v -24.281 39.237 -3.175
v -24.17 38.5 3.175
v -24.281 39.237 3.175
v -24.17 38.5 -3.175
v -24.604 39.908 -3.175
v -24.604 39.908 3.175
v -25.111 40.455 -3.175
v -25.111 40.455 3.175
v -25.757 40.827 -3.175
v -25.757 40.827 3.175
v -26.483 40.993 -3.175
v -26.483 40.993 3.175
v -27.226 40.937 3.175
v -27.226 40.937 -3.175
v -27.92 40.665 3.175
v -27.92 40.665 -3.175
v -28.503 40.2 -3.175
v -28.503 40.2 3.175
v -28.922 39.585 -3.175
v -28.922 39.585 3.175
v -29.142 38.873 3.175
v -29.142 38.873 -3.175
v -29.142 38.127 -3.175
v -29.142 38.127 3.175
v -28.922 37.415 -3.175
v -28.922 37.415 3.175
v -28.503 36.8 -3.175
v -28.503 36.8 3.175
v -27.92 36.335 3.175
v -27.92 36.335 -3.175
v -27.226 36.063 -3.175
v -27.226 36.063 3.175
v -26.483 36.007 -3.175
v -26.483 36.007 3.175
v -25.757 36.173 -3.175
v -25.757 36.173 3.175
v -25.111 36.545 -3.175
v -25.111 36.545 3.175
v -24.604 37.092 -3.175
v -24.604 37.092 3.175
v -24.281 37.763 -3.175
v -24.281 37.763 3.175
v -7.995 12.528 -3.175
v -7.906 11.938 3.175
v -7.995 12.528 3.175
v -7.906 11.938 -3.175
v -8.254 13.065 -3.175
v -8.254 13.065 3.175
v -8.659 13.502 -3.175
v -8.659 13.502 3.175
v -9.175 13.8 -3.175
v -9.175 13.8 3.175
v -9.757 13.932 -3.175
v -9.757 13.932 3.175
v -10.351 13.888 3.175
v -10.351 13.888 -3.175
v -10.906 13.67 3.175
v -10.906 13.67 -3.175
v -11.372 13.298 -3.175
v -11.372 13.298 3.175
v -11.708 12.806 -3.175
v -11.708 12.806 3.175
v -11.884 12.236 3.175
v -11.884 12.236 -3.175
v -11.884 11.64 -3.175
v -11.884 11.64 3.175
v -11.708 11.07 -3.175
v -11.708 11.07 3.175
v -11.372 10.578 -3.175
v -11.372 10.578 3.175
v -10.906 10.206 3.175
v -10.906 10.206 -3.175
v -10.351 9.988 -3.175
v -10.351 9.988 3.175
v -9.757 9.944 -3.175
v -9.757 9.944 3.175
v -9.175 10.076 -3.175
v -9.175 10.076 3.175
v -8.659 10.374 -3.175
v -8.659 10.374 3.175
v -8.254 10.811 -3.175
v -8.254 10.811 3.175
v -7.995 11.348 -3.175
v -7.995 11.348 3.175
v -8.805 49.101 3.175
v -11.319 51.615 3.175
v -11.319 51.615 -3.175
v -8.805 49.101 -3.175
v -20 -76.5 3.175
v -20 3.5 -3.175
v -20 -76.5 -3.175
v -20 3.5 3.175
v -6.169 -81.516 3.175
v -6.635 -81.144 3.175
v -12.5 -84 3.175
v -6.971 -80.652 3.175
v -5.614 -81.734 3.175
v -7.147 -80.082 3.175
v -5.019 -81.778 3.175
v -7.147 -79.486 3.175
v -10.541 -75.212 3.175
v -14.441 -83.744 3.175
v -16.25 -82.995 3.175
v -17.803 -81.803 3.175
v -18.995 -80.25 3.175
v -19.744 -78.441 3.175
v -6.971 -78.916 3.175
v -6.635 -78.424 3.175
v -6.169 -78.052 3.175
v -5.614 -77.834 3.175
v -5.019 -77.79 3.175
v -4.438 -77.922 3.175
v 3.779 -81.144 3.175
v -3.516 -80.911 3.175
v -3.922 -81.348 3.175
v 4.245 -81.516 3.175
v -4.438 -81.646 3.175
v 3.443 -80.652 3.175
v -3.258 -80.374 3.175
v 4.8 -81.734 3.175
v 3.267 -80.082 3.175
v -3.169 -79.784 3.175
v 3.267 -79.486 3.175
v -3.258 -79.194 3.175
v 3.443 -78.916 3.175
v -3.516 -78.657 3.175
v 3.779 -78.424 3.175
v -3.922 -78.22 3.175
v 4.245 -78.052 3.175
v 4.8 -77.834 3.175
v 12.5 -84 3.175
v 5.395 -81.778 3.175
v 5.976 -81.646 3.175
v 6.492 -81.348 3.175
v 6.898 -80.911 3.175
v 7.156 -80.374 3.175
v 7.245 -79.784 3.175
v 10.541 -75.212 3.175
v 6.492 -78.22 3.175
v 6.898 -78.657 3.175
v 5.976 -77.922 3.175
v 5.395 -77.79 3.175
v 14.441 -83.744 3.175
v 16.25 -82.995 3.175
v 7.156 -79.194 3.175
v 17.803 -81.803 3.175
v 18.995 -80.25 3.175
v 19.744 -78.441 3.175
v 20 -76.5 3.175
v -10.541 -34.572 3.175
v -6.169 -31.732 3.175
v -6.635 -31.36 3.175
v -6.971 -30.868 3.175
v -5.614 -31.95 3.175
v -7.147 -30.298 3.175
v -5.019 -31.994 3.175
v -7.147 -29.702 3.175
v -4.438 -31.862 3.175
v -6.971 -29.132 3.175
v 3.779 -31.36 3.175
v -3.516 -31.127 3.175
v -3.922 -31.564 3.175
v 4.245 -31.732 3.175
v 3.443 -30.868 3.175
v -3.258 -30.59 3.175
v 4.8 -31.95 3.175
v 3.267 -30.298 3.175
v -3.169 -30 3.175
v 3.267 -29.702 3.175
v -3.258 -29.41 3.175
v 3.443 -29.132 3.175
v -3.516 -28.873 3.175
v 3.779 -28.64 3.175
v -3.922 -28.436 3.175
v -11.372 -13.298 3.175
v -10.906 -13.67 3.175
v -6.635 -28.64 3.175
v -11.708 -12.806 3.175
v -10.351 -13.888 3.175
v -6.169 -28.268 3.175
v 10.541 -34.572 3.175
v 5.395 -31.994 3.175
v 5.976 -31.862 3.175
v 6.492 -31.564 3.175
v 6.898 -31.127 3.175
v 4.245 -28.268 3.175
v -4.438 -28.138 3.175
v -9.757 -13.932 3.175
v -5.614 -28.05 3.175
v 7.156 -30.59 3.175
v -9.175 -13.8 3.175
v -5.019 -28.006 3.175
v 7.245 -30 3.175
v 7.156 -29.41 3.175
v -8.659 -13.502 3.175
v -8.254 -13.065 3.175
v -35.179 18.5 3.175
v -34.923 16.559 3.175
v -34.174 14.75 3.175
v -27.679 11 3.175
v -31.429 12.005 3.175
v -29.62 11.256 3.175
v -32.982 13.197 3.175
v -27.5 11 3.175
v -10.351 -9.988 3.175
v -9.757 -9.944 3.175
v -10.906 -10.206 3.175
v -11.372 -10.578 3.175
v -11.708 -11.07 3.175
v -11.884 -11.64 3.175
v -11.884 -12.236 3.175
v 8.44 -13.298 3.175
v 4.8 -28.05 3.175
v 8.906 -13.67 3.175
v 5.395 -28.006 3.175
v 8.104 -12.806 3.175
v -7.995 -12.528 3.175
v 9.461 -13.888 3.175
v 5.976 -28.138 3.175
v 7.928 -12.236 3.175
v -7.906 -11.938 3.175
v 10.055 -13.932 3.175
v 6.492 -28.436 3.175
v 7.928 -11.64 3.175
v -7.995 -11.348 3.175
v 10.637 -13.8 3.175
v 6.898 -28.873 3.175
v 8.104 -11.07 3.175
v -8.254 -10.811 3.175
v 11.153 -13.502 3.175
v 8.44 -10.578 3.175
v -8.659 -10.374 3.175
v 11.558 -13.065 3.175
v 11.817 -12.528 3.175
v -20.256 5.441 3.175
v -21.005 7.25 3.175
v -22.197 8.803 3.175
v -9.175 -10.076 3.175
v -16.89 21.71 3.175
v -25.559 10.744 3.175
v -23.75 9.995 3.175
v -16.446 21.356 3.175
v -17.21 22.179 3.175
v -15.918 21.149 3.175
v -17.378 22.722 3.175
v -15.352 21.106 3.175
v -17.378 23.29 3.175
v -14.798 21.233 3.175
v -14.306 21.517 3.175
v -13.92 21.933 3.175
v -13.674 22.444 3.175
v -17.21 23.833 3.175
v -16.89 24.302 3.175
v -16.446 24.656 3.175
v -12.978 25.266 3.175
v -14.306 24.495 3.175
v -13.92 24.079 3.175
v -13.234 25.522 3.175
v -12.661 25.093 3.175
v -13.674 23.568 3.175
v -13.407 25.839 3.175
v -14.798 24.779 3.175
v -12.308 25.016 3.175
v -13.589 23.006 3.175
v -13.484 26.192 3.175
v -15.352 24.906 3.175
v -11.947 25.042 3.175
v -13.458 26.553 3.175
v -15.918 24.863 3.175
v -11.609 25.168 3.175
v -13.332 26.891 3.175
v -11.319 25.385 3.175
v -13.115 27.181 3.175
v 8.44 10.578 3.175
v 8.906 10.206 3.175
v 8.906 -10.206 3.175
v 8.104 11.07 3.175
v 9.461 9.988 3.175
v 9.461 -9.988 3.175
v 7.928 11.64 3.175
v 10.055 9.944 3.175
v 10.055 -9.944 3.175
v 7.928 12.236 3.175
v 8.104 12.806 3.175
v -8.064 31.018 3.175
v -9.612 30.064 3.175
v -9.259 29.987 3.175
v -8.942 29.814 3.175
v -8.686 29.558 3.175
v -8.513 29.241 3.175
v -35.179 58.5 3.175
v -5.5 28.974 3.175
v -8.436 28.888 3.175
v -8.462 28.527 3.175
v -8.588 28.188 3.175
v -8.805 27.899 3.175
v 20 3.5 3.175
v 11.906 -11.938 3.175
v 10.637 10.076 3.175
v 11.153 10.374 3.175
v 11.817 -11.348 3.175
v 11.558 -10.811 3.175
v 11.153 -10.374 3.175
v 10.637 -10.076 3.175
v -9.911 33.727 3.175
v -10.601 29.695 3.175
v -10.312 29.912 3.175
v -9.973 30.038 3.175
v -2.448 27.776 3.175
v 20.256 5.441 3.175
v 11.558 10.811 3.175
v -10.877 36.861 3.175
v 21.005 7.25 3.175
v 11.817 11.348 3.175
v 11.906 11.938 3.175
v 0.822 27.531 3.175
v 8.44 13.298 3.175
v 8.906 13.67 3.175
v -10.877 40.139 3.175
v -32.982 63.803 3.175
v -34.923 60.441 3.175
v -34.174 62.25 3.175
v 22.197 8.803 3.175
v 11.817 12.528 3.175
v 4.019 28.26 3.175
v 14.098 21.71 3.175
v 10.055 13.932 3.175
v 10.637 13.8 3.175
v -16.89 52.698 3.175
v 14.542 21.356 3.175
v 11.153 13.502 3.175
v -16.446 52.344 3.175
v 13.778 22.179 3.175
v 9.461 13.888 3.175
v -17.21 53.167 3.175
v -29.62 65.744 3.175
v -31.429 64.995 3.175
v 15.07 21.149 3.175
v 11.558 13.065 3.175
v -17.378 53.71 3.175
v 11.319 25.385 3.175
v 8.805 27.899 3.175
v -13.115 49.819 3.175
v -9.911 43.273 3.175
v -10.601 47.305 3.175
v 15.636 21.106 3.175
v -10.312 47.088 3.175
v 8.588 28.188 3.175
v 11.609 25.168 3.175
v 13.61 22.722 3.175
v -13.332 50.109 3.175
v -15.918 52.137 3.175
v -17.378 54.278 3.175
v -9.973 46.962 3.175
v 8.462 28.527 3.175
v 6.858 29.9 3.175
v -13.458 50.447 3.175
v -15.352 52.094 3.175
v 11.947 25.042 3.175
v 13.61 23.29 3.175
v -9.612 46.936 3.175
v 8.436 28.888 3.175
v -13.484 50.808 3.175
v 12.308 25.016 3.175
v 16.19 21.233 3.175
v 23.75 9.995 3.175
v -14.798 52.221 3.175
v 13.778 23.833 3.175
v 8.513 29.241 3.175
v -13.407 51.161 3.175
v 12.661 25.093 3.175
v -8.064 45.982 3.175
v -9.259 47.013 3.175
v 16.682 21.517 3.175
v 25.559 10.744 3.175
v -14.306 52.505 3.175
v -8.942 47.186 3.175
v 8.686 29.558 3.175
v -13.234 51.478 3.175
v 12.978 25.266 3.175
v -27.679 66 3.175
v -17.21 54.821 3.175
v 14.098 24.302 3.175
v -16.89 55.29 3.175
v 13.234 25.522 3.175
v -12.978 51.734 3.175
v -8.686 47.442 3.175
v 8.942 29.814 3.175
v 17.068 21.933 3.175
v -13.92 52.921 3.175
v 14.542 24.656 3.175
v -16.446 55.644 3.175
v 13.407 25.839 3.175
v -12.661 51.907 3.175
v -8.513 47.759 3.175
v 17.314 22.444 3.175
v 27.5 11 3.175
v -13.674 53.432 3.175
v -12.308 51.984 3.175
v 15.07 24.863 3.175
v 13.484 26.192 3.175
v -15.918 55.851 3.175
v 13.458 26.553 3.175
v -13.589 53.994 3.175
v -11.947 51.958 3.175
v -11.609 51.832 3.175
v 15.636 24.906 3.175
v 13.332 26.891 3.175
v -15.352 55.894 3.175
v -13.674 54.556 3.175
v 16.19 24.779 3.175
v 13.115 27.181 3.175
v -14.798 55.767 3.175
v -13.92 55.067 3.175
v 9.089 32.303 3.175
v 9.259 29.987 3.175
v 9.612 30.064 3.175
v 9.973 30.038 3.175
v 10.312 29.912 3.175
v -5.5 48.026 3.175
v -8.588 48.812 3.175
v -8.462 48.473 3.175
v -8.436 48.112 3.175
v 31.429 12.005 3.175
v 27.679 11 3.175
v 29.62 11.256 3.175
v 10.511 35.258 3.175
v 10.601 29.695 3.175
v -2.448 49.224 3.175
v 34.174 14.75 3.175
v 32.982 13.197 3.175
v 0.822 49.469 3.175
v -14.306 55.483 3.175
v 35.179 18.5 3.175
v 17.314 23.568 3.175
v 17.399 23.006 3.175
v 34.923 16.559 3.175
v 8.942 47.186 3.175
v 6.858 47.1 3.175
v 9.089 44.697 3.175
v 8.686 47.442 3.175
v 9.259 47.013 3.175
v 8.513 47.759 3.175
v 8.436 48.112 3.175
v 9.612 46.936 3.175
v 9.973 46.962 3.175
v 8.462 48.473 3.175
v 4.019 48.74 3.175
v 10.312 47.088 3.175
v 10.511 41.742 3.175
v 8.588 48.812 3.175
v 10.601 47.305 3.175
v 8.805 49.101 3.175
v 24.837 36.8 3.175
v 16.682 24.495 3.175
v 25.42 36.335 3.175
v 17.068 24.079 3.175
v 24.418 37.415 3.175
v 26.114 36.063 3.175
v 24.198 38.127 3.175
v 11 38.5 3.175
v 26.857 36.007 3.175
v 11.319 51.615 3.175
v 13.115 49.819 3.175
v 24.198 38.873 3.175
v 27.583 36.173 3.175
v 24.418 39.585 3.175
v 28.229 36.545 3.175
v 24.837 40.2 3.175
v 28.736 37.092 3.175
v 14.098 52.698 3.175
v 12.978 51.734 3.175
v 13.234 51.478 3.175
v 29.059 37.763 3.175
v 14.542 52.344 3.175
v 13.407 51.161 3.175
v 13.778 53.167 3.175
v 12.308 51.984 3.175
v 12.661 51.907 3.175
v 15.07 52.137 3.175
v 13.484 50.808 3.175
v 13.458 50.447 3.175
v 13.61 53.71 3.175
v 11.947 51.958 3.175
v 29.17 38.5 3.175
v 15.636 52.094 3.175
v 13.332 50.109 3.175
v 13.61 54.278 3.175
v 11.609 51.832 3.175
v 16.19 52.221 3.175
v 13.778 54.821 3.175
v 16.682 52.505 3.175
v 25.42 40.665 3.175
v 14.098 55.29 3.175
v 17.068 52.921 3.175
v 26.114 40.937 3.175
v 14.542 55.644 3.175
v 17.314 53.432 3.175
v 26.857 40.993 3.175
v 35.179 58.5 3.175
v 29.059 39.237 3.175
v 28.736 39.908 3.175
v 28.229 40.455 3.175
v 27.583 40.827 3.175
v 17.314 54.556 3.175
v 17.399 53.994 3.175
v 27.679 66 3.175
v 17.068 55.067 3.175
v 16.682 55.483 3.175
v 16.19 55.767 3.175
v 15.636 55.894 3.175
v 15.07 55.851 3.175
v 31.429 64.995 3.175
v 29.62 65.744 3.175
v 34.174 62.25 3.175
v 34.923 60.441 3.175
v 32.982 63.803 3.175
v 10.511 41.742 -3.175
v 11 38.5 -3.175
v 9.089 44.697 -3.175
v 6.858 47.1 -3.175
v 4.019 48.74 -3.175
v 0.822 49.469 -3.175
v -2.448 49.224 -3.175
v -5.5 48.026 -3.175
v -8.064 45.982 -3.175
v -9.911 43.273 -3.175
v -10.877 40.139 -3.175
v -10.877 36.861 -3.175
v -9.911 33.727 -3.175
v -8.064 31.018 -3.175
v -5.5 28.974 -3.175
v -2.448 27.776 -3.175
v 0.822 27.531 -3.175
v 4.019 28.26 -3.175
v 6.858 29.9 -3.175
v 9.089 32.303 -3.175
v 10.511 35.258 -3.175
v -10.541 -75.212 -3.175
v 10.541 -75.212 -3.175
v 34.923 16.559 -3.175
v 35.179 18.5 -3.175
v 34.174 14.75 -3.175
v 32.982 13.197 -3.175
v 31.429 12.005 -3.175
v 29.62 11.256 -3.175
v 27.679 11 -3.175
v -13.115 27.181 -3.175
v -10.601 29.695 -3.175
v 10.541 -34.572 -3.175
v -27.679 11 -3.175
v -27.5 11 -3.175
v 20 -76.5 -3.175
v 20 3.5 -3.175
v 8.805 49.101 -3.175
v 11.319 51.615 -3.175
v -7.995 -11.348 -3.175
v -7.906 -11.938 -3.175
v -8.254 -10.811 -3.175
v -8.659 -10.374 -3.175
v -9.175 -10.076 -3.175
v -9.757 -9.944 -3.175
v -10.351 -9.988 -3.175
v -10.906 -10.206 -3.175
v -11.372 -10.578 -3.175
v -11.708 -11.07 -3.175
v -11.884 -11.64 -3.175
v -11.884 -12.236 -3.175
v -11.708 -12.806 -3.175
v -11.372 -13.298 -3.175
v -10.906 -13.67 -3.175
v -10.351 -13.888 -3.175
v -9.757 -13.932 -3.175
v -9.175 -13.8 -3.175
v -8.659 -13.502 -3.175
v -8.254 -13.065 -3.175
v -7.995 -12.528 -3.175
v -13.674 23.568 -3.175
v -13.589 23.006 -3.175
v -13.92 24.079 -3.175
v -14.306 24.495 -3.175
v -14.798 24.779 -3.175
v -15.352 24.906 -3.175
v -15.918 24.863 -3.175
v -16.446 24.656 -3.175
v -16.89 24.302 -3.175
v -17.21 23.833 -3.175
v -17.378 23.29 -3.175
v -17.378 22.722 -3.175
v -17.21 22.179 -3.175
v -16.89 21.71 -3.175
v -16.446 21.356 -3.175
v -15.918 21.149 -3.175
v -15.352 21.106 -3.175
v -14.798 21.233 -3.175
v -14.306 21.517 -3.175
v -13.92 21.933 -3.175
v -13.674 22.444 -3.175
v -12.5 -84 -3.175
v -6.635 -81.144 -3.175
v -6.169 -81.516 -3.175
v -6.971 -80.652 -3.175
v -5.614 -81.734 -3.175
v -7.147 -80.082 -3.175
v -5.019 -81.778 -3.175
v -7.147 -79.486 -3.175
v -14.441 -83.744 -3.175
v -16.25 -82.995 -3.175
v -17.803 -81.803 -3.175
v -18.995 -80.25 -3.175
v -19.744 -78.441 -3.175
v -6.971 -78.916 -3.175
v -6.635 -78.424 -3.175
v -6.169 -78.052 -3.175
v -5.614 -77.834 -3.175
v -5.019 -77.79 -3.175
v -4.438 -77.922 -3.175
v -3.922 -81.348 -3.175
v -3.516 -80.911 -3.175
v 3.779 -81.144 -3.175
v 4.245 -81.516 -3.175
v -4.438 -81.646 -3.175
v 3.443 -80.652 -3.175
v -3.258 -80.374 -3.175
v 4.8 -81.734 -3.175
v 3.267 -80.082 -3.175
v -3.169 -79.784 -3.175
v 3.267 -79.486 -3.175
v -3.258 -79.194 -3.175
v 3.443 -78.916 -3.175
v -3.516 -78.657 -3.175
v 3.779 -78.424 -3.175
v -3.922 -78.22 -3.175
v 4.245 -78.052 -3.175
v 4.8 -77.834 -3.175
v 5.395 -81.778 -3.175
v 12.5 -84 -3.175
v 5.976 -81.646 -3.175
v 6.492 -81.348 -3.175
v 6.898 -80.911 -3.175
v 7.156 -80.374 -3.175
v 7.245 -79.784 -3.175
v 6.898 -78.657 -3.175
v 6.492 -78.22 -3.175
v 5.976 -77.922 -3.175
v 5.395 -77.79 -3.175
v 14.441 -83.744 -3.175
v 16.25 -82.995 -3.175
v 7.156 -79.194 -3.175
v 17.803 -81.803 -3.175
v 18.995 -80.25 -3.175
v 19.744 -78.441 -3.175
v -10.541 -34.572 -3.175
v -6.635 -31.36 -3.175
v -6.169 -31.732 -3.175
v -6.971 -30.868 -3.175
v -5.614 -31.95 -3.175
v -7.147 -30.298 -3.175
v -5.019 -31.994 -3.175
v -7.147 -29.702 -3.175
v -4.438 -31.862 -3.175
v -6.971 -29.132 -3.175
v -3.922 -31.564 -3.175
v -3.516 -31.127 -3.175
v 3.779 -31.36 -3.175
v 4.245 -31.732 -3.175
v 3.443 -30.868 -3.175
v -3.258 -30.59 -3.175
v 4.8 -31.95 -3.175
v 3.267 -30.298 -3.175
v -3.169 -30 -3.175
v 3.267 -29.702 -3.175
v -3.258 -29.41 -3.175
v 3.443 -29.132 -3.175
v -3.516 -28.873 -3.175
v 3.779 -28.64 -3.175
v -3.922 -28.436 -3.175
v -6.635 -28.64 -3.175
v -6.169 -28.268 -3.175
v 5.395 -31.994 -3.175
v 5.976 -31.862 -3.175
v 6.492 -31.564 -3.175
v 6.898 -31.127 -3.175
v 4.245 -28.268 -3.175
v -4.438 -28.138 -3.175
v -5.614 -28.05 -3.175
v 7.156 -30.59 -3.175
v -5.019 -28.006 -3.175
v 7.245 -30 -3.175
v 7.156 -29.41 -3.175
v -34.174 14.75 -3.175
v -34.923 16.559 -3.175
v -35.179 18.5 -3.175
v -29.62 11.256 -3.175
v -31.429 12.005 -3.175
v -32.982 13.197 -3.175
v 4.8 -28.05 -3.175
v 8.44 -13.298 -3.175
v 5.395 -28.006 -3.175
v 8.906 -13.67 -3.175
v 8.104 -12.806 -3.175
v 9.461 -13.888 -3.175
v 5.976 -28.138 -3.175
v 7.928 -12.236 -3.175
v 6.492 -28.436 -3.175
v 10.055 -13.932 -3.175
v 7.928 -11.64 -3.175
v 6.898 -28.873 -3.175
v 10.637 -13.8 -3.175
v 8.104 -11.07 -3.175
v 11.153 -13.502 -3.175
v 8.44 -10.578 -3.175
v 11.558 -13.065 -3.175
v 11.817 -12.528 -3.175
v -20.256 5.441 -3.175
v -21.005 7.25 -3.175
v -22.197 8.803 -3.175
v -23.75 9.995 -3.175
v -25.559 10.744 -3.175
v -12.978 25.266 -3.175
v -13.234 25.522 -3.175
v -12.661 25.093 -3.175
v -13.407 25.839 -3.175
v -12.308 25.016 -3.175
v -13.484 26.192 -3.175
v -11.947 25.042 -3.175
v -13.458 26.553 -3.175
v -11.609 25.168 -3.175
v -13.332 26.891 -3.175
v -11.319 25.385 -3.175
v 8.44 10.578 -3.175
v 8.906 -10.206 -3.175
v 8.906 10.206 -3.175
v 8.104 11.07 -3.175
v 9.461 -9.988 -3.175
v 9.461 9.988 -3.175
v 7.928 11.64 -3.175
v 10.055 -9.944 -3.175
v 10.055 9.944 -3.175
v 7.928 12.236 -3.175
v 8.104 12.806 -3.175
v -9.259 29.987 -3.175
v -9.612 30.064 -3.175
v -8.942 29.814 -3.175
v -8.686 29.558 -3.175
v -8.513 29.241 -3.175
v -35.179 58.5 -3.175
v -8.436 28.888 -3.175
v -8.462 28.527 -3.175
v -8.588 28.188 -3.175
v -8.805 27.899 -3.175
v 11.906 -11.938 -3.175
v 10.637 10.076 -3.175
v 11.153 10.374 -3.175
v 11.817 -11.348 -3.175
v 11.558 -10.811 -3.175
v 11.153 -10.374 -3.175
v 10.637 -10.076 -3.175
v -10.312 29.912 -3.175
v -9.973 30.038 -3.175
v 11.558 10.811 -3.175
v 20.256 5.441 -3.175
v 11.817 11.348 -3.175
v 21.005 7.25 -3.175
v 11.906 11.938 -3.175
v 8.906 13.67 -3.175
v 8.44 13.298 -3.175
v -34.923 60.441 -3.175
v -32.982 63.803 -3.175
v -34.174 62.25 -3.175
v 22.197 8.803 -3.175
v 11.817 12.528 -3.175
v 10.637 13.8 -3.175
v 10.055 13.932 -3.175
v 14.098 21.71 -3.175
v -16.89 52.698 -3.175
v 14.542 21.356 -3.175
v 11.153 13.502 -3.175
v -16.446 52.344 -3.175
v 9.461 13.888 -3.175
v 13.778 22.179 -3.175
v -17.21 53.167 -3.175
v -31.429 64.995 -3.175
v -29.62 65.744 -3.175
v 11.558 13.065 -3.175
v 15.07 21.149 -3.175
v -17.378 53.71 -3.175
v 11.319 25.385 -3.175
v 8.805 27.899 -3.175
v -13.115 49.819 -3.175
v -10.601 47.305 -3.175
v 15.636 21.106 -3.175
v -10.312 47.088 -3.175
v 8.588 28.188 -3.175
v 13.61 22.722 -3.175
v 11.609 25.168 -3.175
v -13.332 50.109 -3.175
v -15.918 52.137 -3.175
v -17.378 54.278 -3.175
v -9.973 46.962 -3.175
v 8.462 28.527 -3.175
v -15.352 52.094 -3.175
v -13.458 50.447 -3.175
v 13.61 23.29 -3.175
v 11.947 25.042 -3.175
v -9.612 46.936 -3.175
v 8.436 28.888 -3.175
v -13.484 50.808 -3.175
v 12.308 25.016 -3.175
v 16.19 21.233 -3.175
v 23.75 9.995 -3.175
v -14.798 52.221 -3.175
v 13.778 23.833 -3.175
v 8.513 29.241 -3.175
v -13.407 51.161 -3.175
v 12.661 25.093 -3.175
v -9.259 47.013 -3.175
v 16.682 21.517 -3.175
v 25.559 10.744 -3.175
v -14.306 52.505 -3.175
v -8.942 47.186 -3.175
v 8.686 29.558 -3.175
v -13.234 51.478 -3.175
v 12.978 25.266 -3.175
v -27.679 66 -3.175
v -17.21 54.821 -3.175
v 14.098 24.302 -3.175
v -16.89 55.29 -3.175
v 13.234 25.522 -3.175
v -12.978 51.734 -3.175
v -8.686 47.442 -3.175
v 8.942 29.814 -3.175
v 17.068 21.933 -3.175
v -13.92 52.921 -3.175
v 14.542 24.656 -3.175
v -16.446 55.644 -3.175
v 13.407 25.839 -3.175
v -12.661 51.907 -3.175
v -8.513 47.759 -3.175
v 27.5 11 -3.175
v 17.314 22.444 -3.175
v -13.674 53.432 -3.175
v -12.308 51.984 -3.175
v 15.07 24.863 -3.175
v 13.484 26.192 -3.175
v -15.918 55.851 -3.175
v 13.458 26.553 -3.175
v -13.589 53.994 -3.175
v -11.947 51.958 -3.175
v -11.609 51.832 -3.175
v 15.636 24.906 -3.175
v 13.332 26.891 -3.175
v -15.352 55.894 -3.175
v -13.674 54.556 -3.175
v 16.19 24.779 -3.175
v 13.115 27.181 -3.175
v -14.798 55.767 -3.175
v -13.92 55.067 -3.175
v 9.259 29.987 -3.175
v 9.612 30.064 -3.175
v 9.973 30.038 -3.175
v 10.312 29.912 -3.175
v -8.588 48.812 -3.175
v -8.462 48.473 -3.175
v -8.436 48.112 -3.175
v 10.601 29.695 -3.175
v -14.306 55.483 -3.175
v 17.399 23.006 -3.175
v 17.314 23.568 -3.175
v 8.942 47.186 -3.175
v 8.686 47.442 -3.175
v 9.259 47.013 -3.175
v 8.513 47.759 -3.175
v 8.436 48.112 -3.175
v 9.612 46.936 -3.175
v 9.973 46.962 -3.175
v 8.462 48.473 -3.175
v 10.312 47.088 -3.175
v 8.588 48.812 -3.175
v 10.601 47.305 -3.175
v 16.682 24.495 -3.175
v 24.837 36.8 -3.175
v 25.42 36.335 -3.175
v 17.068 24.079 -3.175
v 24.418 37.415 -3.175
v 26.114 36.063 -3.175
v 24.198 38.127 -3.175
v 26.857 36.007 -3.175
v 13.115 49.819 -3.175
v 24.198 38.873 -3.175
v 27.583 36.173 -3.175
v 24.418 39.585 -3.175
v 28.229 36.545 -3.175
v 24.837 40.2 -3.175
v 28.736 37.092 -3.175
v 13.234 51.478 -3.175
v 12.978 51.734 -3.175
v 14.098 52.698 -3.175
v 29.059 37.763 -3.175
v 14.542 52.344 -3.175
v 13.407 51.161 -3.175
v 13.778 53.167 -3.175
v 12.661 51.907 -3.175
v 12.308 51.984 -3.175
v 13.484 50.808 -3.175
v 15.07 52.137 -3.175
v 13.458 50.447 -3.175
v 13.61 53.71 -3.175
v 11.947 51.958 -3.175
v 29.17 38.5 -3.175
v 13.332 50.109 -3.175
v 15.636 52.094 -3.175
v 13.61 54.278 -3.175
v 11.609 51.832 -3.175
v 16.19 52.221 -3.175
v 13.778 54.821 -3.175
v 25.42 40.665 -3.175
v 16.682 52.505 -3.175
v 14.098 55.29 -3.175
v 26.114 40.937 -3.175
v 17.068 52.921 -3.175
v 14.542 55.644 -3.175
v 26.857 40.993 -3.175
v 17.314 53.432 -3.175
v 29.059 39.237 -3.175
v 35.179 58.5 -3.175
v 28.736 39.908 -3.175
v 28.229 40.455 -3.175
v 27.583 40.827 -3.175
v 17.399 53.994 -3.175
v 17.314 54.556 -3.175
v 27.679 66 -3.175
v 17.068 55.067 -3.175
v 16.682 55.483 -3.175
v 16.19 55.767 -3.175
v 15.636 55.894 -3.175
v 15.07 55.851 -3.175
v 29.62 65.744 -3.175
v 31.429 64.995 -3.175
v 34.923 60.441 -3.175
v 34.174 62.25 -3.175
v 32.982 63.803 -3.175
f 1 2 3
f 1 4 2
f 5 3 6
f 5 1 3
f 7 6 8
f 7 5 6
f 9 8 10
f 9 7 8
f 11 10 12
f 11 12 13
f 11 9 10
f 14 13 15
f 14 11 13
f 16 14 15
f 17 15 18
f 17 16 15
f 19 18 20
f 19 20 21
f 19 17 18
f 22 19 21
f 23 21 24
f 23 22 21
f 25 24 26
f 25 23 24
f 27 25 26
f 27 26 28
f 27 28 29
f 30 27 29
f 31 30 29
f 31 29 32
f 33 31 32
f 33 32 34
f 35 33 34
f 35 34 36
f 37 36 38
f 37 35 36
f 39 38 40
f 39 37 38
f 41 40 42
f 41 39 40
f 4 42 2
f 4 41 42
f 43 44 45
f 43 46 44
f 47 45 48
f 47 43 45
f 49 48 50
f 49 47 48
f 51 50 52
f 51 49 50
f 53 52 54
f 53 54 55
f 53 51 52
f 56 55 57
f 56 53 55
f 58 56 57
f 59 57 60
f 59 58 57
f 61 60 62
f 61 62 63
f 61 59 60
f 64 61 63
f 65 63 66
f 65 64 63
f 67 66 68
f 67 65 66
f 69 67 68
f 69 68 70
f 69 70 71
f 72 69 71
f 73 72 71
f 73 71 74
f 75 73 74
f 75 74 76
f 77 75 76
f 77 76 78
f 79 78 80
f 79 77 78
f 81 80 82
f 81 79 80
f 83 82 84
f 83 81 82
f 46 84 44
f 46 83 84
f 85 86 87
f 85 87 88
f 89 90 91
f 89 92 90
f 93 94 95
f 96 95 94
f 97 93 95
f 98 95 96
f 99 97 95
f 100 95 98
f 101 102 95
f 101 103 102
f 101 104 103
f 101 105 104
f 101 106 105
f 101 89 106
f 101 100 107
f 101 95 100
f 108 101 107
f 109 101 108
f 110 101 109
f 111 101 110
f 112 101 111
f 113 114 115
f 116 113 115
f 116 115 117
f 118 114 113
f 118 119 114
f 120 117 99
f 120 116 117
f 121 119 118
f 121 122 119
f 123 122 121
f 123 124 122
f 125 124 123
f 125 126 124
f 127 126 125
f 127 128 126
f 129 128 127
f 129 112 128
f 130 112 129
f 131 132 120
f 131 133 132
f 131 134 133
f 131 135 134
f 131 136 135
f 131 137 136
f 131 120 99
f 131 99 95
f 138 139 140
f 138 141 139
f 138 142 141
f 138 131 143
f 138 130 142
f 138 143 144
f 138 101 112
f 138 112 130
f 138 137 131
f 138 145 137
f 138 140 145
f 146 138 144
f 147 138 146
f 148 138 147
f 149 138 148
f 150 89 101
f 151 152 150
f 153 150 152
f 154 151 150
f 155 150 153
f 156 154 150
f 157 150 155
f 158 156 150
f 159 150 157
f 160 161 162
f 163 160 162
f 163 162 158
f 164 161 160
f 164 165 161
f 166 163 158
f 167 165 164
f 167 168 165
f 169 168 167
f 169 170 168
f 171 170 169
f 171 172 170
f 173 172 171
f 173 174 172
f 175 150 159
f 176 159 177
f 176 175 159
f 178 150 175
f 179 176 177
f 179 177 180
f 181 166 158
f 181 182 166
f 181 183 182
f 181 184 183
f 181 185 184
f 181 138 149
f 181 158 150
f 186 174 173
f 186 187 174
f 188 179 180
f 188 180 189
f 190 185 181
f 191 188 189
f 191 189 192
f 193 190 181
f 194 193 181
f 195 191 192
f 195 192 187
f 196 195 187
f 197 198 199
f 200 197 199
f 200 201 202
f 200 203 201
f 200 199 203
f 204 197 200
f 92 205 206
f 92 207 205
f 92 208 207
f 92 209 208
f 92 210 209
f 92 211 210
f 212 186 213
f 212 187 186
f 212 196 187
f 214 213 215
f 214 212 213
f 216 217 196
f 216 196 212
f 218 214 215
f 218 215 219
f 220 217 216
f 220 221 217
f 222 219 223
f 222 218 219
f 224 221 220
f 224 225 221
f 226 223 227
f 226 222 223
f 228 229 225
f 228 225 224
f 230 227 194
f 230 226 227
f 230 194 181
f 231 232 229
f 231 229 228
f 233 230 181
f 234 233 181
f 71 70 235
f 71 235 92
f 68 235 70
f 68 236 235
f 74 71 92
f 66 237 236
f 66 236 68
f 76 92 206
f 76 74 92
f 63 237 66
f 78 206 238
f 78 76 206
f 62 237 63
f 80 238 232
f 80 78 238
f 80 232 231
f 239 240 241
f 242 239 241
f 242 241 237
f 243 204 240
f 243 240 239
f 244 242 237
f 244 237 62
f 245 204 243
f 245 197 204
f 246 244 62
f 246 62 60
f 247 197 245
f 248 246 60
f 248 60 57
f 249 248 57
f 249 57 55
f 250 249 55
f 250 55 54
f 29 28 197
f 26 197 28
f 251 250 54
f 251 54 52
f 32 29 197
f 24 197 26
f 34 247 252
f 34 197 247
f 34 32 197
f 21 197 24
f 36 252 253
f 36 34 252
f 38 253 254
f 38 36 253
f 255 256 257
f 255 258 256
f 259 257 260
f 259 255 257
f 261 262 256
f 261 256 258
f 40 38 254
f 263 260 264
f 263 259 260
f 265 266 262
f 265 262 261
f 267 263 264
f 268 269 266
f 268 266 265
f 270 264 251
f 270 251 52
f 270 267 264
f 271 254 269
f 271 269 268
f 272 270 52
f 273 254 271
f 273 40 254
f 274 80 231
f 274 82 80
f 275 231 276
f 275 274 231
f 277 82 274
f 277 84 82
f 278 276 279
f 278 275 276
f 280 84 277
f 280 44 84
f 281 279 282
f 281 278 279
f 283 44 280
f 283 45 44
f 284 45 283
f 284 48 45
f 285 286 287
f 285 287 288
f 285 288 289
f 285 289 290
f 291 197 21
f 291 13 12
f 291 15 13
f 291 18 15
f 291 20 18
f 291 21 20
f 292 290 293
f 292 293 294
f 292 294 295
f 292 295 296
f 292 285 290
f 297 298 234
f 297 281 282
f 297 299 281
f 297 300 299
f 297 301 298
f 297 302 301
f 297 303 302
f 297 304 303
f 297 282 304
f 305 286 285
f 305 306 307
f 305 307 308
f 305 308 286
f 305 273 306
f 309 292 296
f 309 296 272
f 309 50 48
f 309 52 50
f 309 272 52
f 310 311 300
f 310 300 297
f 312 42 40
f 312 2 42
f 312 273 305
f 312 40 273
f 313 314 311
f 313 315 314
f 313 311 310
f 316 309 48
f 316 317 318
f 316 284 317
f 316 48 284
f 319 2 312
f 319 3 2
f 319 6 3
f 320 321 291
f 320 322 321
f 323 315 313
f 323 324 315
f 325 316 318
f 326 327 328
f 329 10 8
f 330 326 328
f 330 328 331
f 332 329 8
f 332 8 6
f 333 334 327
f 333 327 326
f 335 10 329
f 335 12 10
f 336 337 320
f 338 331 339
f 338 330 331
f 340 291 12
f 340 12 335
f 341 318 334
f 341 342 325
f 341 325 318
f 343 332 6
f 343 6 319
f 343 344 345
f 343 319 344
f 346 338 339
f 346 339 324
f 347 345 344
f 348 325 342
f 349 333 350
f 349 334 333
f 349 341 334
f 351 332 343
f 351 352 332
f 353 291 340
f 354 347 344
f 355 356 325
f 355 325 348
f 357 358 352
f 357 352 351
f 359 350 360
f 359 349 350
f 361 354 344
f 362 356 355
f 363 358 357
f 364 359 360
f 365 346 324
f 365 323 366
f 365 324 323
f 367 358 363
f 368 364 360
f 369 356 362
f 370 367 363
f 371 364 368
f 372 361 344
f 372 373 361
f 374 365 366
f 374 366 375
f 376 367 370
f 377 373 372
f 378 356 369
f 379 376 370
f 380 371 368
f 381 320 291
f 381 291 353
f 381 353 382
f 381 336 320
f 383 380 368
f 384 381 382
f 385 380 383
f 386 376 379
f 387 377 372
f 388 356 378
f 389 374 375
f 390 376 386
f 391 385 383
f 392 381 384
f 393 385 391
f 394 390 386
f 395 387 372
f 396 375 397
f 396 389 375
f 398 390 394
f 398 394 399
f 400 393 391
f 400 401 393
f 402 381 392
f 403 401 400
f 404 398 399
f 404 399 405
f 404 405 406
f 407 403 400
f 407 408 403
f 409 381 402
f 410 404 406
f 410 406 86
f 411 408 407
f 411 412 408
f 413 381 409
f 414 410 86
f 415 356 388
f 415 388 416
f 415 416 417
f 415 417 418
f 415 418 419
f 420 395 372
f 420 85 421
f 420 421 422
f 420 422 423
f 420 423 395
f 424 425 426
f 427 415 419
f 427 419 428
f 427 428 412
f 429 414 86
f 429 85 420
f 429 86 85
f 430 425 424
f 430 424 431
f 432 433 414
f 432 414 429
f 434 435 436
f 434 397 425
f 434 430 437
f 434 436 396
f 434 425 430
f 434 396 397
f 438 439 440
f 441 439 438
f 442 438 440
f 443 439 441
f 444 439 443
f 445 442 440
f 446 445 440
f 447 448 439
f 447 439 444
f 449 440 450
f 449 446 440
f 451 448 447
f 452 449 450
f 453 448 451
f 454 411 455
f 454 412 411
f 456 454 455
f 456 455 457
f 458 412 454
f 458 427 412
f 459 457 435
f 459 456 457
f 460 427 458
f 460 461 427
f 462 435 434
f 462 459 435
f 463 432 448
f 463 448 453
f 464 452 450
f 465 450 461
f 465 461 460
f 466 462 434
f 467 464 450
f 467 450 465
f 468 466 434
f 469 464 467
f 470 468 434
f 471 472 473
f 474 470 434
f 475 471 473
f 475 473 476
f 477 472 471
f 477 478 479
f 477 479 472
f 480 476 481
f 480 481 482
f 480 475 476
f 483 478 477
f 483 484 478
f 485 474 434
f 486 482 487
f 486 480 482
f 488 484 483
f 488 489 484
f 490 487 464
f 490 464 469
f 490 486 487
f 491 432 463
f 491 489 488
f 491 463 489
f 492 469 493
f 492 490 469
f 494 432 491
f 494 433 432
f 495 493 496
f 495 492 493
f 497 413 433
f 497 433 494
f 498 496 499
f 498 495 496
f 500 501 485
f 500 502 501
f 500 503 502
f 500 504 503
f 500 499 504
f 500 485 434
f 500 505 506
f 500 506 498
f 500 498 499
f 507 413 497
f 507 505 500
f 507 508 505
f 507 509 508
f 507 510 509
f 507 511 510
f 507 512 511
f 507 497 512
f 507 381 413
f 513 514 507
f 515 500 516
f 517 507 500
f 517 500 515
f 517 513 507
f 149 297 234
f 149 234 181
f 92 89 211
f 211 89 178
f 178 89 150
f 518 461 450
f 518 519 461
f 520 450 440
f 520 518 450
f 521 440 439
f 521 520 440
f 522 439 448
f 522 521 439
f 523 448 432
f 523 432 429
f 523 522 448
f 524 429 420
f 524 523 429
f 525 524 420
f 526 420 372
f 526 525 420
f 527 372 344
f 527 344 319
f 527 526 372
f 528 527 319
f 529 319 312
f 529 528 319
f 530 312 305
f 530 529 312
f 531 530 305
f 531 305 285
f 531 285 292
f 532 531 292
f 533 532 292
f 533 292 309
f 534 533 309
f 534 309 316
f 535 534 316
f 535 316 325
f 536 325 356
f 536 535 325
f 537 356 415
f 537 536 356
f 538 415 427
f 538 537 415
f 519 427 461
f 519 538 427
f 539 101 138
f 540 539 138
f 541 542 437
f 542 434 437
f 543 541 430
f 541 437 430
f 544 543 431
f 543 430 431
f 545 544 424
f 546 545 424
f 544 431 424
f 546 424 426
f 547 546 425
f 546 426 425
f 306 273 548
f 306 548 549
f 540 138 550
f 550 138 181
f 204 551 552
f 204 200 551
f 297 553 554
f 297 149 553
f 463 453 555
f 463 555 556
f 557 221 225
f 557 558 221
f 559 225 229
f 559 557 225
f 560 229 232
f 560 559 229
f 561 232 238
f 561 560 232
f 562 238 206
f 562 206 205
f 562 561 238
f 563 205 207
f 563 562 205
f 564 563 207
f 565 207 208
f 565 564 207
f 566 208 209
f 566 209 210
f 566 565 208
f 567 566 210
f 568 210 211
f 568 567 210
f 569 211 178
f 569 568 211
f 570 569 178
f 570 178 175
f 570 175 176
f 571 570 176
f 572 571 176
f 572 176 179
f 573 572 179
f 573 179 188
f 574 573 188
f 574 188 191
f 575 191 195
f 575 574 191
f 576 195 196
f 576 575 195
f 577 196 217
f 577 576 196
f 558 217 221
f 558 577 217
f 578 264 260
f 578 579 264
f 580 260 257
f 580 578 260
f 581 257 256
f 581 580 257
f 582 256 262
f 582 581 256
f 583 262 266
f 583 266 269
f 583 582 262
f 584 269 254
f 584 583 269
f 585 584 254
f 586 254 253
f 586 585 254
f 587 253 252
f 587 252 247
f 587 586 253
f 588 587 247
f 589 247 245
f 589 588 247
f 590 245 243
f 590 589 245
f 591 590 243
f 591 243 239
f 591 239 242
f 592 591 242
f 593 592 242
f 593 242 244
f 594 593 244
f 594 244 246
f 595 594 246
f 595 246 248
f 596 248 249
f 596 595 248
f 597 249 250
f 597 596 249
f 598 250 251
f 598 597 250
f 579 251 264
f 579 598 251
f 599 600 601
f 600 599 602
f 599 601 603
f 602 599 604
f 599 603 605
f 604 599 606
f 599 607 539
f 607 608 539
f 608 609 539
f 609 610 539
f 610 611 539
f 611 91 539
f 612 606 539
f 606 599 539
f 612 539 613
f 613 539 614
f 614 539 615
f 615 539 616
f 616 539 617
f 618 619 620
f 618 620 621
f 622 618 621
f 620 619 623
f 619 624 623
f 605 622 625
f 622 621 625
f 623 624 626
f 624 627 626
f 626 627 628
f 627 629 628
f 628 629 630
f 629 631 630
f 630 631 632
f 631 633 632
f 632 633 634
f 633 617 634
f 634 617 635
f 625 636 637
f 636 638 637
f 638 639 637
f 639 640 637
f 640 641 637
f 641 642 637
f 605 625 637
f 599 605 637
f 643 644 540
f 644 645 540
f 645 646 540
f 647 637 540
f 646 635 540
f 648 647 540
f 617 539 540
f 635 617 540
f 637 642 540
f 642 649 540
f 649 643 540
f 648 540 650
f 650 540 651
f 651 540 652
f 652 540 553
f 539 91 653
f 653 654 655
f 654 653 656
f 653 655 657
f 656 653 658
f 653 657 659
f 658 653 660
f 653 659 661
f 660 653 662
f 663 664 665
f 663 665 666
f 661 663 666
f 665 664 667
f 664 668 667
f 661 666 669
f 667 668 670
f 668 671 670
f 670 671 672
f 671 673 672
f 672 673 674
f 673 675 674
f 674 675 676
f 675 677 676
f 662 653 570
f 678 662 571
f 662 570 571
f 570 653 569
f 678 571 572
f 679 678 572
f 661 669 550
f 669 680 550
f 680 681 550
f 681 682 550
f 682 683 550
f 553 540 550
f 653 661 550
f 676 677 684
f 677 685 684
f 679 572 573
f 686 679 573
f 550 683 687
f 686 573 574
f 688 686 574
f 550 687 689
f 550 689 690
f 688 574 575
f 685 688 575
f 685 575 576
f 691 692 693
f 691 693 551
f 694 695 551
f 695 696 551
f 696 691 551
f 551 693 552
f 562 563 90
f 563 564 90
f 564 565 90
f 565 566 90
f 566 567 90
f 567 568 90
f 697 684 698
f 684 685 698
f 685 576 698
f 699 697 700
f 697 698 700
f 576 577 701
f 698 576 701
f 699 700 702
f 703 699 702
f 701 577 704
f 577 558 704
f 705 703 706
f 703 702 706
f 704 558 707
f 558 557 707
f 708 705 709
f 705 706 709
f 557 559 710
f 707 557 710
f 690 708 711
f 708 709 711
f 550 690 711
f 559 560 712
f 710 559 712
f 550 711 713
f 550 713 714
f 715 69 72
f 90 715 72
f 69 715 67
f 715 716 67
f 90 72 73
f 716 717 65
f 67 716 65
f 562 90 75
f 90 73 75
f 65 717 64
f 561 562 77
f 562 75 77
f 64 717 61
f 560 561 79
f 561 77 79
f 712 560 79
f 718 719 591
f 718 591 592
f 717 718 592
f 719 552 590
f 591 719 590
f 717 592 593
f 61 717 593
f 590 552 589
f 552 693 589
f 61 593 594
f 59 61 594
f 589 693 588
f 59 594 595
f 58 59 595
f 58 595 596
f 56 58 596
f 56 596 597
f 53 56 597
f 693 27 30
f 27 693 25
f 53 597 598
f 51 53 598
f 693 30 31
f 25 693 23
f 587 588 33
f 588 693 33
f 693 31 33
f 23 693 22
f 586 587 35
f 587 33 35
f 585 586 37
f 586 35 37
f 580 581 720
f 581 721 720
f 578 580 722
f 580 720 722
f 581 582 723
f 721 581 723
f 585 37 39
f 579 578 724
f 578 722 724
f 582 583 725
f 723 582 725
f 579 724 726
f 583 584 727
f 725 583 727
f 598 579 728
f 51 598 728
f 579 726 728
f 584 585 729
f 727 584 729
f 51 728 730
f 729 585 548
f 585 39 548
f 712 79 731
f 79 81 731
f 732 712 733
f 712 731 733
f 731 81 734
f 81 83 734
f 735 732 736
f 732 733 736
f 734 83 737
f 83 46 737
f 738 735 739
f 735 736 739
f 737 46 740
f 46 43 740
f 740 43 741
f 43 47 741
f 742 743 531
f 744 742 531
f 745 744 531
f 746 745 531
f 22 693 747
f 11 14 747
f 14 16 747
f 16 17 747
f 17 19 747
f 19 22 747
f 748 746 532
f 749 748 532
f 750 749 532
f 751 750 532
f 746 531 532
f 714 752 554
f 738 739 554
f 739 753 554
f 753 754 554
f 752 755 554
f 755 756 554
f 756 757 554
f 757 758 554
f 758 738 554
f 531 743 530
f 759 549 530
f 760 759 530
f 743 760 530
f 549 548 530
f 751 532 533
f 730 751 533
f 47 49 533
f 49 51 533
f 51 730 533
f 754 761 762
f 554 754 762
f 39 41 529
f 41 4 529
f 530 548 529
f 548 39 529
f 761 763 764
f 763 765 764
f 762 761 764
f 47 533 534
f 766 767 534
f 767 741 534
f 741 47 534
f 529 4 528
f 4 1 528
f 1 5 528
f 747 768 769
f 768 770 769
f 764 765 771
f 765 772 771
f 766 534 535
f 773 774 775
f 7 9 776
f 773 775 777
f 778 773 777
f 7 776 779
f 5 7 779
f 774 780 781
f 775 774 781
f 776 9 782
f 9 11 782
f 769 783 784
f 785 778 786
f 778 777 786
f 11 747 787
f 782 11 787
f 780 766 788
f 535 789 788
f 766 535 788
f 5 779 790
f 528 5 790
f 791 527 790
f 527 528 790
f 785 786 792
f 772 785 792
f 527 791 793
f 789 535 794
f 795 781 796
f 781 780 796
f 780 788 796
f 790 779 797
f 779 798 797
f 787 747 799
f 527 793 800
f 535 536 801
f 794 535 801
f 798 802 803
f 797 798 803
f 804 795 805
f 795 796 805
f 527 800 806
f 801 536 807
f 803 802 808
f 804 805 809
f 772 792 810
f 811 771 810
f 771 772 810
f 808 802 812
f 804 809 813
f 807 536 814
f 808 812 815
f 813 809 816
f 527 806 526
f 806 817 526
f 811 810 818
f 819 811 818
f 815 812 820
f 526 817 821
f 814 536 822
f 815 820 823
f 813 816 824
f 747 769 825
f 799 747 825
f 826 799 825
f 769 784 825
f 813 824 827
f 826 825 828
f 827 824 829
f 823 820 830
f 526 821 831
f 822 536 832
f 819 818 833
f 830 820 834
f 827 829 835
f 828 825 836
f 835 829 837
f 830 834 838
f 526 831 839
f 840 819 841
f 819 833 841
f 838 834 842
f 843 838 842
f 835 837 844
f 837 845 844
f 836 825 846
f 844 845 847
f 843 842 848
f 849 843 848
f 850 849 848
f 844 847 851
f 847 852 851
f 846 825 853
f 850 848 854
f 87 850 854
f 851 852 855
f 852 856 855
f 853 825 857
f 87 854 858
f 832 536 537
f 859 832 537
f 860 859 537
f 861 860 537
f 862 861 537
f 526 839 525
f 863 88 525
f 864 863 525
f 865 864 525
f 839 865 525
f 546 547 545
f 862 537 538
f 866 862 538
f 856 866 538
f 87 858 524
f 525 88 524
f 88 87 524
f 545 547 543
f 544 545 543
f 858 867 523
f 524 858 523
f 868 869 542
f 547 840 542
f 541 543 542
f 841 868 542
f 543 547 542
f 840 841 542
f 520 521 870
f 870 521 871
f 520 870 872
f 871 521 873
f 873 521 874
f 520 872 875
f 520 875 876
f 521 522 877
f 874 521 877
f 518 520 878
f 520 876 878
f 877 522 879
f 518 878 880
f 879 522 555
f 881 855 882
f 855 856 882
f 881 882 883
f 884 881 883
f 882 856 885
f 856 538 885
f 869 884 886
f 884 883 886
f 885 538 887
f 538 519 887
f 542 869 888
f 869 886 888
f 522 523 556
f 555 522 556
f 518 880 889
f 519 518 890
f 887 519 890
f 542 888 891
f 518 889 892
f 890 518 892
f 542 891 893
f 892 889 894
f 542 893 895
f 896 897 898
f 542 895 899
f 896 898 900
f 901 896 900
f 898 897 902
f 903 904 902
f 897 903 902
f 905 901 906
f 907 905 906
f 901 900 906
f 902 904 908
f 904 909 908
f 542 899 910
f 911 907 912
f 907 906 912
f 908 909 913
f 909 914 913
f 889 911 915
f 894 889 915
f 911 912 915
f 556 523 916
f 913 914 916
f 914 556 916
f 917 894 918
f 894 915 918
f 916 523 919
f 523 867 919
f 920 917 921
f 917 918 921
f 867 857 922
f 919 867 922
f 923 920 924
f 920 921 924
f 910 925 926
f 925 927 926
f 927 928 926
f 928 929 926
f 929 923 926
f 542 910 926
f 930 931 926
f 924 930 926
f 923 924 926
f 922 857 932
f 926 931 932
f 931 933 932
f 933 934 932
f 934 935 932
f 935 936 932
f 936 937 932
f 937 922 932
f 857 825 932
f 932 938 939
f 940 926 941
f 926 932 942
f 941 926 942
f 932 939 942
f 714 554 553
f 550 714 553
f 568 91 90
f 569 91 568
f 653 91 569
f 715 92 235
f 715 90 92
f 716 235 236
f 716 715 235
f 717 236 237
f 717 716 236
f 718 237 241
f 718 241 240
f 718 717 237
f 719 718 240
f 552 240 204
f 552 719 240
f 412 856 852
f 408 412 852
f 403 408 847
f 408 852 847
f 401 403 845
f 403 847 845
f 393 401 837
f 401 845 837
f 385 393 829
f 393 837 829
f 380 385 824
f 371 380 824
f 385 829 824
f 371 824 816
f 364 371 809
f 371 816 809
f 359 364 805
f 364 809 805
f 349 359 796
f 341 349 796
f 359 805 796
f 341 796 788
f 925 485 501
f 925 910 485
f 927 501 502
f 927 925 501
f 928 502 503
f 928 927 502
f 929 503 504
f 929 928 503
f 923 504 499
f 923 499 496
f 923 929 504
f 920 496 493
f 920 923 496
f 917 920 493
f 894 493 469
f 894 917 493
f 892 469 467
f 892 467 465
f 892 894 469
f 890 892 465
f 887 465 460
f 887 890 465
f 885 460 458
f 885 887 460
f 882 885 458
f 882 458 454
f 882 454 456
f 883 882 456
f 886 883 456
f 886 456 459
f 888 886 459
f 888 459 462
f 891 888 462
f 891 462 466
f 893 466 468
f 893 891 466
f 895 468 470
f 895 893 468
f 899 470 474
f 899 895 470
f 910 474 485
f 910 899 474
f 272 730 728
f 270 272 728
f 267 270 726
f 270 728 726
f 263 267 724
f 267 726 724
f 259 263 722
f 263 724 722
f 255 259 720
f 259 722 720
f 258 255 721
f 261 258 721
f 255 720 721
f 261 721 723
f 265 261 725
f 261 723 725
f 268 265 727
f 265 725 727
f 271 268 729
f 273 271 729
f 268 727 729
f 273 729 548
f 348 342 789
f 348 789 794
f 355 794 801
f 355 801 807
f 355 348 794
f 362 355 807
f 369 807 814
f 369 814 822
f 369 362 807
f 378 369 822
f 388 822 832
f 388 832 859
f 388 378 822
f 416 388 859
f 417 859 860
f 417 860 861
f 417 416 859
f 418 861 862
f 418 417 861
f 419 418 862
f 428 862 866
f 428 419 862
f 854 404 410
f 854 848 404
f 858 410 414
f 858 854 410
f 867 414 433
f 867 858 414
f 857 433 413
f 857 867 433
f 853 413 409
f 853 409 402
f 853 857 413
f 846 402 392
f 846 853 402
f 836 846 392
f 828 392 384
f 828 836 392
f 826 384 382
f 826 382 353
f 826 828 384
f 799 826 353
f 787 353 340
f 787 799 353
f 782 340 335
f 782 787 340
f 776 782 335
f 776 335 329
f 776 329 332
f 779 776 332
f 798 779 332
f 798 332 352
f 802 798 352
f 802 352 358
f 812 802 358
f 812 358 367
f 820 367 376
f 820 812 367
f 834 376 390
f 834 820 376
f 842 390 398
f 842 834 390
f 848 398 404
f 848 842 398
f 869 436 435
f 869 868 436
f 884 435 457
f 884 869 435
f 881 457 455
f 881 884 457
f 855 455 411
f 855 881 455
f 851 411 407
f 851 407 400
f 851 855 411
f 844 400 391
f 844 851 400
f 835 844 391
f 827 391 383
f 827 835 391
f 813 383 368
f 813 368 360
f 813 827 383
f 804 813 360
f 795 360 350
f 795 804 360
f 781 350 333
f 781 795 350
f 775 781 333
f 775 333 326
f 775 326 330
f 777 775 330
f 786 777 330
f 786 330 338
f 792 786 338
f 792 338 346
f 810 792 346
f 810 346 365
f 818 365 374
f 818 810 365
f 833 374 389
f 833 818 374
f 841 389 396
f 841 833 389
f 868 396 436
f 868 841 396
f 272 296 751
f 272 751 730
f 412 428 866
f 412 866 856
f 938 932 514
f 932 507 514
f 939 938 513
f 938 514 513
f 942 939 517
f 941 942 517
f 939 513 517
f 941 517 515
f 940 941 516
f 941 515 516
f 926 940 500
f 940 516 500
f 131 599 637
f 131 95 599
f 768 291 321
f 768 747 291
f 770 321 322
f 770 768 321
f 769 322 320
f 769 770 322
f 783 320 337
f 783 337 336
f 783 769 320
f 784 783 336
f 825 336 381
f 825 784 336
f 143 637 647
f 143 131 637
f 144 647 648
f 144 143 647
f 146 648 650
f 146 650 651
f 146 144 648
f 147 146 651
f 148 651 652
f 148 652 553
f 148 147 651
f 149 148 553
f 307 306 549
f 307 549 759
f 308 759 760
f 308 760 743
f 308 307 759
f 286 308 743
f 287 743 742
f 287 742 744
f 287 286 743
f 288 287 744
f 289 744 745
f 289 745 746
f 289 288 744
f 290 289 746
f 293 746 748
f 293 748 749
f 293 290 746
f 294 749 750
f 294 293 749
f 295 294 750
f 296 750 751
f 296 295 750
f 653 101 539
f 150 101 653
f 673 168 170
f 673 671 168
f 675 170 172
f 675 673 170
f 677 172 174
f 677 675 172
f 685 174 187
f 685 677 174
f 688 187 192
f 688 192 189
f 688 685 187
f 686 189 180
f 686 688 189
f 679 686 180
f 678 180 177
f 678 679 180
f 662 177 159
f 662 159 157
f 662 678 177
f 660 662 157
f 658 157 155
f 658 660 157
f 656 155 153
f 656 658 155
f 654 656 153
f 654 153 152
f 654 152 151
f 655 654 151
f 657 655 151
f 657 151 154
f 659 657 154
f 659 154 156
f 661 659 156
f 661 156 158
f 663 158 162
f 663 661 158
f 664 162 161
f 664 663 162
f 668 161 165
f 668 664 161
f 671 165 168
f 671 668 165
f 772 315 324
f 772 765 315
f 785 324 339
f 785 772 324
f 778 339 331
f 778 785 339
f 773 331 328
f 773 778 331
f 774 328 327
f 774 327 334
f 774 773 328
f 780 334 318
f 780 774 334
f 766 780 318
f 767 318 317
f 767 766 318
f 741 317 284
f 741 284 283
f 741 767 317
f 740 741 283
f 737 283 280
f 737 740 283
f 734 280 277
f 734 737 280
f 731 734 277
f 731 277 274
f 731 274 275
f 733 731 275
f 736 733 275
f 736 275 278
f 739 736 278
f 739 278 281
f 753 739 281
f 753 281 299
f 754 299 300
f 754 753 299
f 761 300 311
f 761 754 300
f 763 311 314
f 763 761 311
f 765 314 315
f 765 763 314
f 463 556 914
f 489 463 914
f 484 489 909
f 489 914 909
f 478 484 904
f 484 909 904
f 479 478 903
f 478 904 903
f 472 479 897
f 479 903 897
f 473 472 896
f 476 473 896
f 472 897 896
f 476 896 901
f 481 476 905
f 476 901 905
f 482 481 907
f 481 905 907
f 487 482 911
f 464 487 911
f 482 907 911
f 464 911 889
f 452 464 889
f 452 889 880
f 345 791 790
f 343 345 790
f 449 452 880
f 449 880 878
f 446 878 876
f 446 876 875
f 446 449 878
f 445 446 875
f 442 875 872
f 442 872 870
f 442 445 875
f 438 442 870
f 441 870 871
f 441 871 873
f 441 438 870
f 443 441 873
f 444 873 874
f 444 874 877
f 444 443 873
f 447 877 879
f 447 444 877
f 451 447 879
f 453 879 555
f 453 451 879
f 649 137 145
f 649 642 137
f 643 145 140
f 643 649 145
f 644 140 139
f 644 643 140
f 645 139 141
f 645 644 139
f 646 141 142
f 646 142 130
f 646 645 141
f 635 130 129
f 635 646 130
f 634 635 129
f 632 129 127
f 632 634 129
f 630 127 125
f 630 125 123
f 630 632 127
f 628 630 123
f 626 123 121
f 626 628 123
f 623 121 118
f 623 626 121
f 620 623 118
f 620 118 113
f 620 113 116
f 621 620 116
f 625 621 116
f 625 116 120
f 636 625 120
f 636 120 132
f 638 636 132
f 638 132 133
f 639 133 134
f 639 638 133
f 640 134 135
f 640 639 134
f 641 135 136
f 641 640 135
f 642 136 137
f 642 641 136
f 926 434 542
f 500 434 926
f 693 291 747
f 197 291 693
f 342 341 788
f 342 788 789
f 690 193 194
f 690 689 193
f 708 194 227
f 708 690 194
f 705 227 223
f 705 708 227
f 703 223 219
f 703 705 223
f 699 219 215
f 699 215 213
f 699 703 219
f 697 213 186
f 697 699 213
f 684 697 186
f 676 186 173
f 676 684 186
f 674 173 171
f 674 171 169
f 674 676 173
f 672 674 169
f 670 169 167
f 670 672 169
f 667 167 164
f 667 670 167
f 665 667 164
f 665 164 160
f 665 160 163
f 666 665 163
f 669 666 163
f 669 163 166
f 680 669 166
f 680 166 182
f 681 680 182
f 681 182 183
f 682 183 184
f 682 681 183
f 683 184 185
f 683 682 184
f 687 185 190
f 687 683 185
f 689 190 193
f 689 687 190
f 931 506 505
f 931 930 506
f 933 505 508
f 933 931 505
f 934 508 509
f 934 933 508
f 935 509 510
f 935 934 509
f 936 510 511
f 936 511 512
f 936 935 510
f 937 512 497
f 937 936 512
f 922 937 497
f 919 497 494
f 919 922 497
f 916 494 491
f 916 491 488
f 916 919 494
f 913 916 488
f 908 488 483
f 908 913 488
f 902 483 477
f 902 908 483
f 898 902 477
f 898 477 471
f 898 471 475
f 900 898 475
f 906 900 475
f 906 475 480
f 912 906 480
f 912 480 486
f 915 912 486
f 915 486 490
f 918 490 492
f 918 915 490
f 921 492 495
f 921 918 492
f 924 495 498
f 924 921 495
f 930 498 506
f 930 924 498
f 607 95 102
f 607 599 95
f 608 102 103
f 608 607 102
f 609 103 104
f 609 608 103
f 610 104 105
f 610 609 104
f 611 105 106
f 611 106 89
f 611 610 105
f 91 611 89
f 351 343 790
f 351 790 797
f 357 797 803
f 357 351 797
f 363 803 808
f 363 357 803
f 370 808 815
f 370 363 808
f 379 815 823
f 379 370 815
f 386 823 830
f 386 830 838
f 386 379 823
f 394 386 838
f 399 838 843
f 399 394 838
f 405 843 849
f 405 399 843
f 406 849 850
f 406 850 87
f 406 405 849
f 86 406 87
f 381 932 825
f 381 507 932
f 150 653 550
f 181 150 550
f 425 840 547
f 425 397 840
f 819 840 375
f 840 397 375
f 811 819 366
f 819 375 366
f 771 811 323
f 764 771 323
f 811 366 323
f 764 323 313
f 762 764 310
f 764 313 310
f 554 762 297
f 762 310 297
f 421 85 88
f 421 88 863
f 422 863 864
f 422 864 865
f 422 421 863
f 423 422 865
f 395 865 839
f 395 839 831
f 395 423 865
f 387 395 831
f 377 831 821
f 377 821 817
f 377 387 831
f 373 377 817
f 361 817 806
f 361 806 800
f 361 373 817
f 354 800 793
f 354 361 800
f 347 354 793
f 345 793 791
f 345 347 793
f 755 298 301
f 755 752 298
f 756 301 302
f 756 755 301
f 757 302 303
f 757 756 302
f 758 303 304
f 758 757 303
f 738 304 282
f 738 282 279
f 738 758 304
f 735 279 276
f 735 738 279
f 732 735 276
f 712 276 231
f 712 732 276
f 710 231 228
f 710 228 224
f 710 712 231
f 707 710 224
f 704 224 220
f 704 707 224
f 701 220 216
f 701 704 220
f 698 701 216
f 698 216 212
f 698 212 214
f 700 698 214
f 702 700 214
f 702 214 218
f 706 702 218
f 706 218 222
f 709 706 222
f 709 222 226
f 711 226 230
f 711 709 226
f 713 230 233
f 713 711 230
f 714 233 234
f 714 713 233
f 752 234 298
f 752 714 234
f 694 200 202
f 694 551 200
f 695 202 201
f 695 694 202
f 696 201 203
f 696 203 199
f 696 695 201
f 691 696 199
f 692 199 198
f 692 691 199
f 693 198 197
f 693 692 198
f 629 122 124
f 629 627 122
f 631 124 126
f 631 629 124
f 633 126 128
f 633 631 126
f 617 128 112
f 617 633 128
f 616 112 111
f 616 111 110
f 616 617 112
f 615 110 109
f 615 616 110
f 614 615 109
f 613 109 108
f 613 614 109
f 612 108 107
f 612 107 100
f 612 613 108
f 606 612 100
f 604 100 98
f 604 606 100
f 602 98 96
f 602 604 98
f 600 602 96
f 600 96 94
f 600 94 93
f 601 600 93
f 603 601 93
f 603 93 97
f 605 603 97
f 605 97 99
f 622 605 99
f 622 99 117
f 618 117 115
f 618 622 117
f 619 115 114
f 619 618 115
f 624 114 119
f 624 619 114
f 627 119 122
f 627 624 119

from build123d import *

# Parameters (mm, degrees)
SKETCH1_R           = 2
SKETCH1_R_2         = 11
SKETCH1_R_3         = 1.905
SKETCH1_R_4         = 2.5
SKETCH1_W           = 21.082
SKETCH1_H           = 40.64
BOSS_EXTRUDE1_DEPTH = 3.175
FILLET1_R           = 7.5


with BuildPart() as part:
    # Sketch1 → Boss-Extrude1 (new, symmetric)
    with BuildSketch(Plane.XY):
        Polygon((-20, -84), (20, -84), (20, 11), (35.179, 11), (35.179, 66), (-35.179, 66), (-35.179, 11), (-20, 11), align=None)
        with Locations((9.906, 11.938)):
            Circle(SKETCH1_R, mode=Mode.SUBTRACT)
        with Locations((-9.906, 11.938)):
            Circle(SKETCH1_R, mode=Mode.SUBTRACT)
        with Locations((-9.906, -11.938)):
            Circle(SKETCH1_R, mode=Mode.SUBTRACT)
        with Locations((9.906, -11.938)):
            Circle(SKETCH1_R, mode=Mode.SUBTRACT)
        with Locations((0, 38.5)):
            Circle(SKETCH1_R_2, mode=Mode.SUBTRACT)
        with Locations((15.494, 53.994)):
            Circle(SKETCH1_R_3, mode=Mode.SUBTRACT)
        with Locations((-5.1689, -30)):
            Circle(SKETCH1_R, mode=Mode.SUBTRACT)
        with Locations((5.2451, -30)):
            Circle(SKETCH1_R, mode=Mode.SUBTRACT)
        with Locations((5.2451, -79.784)):
            Circle(SKETCH1_R, mode=Mode.SUBTRACT)
        with Locations((-5.1689, -79.784)):
            Circle(SKETCH1_R, mode=Mode.SUBTRACT)
        with Locations((-26.67, 38.5)):
            Circle(SKETCH1_R_4, mode=Mode.SUBTRACT)
        with Locations((26.67, 38.5)):
            Circle(SKETCH1_R_4, mode=Mode.SUBTRACT)
        with Locations((15.494, 23.006)):
            Circle(SKETCH1_R_3, mode=Mode.SUBTRACT)
        with Locations((-15.494, 23.006)):
            Circle(SKETCH1_R_3, mode=Mode.SUBTRACT)
        with Locations((-15.494, 53.994)):
            Circle(SKETCH1_R_3, mode=Mode.SUBTRACT)
        with BuildLine():
            Line((8.804893639, 49.100944864), (11.319365353, 51.615416577))
            ThreePointArc((11.319365353, 51.615416577), (13.115416577, 51.615416577), (13.115416577, 49.819365353))
            Line((13.115416577, 49.819365353), (10.600944864, 47.304893639))
            ThreePointArc((10.600944864, 47.304893639), (8.804893639, 47.304893639), (8.804893639, 49.100944864))
        make_face(mode=Mode.SUBTRACT)
        with Locations((0, -54.892)):
            Rectangle(SKETCH1_W, SKETCH1_H, mode=Mode.SUBTRACT)
        with BuildLine():
            Line((10.600944864, 29.695106361), (13.115416577, 27.180634647))
            ThreePointArc((13.115416577, 27.180634647), (13.115416577, 25.384583423), (11.319365353, 25.384583423))
            Line((11.319365353, 25.384583423), (8.804893639, 27.899055136))
            ThreePointArc((8.804893639, 27.899055136), (8.804893639, 29.695106361), (10.600944864, 29.695106361))
        make_face(mode=Mode.SUBTRACT)
        with BuildLine():
            Line((-8.804893639, 27.899055136), (-11.319365353, 25.384583423))
            ThreePointArc((-11.319365353, 25.384583423), (-13.115416577, 25.384583423), (-13.115416577, 27.180634647))
            Line((-13.115416577, 27.180634647), (-10.600944864, 29.695106361))
            ThreePointArc((-10.600944864, 29.695106361), (-8.804893639, 29.695106361), (-8.804893639, 27.899055136))
        make_face(mode=Mode.SUBTRACT)
        with BuildLine():
            Line((-10.600944864, 47.304893639), (-13.115416577, 49.819365353))
            ThreePointArc((-13.115416577, 49.819365353), (-13.115416577, 51.615416577), (-11.319365353, 51.615416577))
            Line((-11.319365353, 51.615416577), (-8.804893639, 49.100944864))
            ThreePointArc((-8.804893639, 49.100944864), (-8.804893639, 47.304893639), (-10.600944864, 47.304893639))
        make_face(mode=Mode.SUBTRACT)
    extrude(amount=BOSS_EXTRUDE1_DEPTH, both=True)

    # Fillet1
    fillet1_edges = [part.edges().sort_by_distance(p)[0] for p in [
        (20, -84, 0),
        (-20, -84, 0),
        (-20, 11, 0),
        (-35.179, 11, 0),
        (-35.179, 66, 0),
        (35.179, 66, 0),
        (35.179, 11, 0),
        (20, 11, 0),
    ]]
    fillet(fillet1_edges, radius=FILLET1_R)


solid = part.part
